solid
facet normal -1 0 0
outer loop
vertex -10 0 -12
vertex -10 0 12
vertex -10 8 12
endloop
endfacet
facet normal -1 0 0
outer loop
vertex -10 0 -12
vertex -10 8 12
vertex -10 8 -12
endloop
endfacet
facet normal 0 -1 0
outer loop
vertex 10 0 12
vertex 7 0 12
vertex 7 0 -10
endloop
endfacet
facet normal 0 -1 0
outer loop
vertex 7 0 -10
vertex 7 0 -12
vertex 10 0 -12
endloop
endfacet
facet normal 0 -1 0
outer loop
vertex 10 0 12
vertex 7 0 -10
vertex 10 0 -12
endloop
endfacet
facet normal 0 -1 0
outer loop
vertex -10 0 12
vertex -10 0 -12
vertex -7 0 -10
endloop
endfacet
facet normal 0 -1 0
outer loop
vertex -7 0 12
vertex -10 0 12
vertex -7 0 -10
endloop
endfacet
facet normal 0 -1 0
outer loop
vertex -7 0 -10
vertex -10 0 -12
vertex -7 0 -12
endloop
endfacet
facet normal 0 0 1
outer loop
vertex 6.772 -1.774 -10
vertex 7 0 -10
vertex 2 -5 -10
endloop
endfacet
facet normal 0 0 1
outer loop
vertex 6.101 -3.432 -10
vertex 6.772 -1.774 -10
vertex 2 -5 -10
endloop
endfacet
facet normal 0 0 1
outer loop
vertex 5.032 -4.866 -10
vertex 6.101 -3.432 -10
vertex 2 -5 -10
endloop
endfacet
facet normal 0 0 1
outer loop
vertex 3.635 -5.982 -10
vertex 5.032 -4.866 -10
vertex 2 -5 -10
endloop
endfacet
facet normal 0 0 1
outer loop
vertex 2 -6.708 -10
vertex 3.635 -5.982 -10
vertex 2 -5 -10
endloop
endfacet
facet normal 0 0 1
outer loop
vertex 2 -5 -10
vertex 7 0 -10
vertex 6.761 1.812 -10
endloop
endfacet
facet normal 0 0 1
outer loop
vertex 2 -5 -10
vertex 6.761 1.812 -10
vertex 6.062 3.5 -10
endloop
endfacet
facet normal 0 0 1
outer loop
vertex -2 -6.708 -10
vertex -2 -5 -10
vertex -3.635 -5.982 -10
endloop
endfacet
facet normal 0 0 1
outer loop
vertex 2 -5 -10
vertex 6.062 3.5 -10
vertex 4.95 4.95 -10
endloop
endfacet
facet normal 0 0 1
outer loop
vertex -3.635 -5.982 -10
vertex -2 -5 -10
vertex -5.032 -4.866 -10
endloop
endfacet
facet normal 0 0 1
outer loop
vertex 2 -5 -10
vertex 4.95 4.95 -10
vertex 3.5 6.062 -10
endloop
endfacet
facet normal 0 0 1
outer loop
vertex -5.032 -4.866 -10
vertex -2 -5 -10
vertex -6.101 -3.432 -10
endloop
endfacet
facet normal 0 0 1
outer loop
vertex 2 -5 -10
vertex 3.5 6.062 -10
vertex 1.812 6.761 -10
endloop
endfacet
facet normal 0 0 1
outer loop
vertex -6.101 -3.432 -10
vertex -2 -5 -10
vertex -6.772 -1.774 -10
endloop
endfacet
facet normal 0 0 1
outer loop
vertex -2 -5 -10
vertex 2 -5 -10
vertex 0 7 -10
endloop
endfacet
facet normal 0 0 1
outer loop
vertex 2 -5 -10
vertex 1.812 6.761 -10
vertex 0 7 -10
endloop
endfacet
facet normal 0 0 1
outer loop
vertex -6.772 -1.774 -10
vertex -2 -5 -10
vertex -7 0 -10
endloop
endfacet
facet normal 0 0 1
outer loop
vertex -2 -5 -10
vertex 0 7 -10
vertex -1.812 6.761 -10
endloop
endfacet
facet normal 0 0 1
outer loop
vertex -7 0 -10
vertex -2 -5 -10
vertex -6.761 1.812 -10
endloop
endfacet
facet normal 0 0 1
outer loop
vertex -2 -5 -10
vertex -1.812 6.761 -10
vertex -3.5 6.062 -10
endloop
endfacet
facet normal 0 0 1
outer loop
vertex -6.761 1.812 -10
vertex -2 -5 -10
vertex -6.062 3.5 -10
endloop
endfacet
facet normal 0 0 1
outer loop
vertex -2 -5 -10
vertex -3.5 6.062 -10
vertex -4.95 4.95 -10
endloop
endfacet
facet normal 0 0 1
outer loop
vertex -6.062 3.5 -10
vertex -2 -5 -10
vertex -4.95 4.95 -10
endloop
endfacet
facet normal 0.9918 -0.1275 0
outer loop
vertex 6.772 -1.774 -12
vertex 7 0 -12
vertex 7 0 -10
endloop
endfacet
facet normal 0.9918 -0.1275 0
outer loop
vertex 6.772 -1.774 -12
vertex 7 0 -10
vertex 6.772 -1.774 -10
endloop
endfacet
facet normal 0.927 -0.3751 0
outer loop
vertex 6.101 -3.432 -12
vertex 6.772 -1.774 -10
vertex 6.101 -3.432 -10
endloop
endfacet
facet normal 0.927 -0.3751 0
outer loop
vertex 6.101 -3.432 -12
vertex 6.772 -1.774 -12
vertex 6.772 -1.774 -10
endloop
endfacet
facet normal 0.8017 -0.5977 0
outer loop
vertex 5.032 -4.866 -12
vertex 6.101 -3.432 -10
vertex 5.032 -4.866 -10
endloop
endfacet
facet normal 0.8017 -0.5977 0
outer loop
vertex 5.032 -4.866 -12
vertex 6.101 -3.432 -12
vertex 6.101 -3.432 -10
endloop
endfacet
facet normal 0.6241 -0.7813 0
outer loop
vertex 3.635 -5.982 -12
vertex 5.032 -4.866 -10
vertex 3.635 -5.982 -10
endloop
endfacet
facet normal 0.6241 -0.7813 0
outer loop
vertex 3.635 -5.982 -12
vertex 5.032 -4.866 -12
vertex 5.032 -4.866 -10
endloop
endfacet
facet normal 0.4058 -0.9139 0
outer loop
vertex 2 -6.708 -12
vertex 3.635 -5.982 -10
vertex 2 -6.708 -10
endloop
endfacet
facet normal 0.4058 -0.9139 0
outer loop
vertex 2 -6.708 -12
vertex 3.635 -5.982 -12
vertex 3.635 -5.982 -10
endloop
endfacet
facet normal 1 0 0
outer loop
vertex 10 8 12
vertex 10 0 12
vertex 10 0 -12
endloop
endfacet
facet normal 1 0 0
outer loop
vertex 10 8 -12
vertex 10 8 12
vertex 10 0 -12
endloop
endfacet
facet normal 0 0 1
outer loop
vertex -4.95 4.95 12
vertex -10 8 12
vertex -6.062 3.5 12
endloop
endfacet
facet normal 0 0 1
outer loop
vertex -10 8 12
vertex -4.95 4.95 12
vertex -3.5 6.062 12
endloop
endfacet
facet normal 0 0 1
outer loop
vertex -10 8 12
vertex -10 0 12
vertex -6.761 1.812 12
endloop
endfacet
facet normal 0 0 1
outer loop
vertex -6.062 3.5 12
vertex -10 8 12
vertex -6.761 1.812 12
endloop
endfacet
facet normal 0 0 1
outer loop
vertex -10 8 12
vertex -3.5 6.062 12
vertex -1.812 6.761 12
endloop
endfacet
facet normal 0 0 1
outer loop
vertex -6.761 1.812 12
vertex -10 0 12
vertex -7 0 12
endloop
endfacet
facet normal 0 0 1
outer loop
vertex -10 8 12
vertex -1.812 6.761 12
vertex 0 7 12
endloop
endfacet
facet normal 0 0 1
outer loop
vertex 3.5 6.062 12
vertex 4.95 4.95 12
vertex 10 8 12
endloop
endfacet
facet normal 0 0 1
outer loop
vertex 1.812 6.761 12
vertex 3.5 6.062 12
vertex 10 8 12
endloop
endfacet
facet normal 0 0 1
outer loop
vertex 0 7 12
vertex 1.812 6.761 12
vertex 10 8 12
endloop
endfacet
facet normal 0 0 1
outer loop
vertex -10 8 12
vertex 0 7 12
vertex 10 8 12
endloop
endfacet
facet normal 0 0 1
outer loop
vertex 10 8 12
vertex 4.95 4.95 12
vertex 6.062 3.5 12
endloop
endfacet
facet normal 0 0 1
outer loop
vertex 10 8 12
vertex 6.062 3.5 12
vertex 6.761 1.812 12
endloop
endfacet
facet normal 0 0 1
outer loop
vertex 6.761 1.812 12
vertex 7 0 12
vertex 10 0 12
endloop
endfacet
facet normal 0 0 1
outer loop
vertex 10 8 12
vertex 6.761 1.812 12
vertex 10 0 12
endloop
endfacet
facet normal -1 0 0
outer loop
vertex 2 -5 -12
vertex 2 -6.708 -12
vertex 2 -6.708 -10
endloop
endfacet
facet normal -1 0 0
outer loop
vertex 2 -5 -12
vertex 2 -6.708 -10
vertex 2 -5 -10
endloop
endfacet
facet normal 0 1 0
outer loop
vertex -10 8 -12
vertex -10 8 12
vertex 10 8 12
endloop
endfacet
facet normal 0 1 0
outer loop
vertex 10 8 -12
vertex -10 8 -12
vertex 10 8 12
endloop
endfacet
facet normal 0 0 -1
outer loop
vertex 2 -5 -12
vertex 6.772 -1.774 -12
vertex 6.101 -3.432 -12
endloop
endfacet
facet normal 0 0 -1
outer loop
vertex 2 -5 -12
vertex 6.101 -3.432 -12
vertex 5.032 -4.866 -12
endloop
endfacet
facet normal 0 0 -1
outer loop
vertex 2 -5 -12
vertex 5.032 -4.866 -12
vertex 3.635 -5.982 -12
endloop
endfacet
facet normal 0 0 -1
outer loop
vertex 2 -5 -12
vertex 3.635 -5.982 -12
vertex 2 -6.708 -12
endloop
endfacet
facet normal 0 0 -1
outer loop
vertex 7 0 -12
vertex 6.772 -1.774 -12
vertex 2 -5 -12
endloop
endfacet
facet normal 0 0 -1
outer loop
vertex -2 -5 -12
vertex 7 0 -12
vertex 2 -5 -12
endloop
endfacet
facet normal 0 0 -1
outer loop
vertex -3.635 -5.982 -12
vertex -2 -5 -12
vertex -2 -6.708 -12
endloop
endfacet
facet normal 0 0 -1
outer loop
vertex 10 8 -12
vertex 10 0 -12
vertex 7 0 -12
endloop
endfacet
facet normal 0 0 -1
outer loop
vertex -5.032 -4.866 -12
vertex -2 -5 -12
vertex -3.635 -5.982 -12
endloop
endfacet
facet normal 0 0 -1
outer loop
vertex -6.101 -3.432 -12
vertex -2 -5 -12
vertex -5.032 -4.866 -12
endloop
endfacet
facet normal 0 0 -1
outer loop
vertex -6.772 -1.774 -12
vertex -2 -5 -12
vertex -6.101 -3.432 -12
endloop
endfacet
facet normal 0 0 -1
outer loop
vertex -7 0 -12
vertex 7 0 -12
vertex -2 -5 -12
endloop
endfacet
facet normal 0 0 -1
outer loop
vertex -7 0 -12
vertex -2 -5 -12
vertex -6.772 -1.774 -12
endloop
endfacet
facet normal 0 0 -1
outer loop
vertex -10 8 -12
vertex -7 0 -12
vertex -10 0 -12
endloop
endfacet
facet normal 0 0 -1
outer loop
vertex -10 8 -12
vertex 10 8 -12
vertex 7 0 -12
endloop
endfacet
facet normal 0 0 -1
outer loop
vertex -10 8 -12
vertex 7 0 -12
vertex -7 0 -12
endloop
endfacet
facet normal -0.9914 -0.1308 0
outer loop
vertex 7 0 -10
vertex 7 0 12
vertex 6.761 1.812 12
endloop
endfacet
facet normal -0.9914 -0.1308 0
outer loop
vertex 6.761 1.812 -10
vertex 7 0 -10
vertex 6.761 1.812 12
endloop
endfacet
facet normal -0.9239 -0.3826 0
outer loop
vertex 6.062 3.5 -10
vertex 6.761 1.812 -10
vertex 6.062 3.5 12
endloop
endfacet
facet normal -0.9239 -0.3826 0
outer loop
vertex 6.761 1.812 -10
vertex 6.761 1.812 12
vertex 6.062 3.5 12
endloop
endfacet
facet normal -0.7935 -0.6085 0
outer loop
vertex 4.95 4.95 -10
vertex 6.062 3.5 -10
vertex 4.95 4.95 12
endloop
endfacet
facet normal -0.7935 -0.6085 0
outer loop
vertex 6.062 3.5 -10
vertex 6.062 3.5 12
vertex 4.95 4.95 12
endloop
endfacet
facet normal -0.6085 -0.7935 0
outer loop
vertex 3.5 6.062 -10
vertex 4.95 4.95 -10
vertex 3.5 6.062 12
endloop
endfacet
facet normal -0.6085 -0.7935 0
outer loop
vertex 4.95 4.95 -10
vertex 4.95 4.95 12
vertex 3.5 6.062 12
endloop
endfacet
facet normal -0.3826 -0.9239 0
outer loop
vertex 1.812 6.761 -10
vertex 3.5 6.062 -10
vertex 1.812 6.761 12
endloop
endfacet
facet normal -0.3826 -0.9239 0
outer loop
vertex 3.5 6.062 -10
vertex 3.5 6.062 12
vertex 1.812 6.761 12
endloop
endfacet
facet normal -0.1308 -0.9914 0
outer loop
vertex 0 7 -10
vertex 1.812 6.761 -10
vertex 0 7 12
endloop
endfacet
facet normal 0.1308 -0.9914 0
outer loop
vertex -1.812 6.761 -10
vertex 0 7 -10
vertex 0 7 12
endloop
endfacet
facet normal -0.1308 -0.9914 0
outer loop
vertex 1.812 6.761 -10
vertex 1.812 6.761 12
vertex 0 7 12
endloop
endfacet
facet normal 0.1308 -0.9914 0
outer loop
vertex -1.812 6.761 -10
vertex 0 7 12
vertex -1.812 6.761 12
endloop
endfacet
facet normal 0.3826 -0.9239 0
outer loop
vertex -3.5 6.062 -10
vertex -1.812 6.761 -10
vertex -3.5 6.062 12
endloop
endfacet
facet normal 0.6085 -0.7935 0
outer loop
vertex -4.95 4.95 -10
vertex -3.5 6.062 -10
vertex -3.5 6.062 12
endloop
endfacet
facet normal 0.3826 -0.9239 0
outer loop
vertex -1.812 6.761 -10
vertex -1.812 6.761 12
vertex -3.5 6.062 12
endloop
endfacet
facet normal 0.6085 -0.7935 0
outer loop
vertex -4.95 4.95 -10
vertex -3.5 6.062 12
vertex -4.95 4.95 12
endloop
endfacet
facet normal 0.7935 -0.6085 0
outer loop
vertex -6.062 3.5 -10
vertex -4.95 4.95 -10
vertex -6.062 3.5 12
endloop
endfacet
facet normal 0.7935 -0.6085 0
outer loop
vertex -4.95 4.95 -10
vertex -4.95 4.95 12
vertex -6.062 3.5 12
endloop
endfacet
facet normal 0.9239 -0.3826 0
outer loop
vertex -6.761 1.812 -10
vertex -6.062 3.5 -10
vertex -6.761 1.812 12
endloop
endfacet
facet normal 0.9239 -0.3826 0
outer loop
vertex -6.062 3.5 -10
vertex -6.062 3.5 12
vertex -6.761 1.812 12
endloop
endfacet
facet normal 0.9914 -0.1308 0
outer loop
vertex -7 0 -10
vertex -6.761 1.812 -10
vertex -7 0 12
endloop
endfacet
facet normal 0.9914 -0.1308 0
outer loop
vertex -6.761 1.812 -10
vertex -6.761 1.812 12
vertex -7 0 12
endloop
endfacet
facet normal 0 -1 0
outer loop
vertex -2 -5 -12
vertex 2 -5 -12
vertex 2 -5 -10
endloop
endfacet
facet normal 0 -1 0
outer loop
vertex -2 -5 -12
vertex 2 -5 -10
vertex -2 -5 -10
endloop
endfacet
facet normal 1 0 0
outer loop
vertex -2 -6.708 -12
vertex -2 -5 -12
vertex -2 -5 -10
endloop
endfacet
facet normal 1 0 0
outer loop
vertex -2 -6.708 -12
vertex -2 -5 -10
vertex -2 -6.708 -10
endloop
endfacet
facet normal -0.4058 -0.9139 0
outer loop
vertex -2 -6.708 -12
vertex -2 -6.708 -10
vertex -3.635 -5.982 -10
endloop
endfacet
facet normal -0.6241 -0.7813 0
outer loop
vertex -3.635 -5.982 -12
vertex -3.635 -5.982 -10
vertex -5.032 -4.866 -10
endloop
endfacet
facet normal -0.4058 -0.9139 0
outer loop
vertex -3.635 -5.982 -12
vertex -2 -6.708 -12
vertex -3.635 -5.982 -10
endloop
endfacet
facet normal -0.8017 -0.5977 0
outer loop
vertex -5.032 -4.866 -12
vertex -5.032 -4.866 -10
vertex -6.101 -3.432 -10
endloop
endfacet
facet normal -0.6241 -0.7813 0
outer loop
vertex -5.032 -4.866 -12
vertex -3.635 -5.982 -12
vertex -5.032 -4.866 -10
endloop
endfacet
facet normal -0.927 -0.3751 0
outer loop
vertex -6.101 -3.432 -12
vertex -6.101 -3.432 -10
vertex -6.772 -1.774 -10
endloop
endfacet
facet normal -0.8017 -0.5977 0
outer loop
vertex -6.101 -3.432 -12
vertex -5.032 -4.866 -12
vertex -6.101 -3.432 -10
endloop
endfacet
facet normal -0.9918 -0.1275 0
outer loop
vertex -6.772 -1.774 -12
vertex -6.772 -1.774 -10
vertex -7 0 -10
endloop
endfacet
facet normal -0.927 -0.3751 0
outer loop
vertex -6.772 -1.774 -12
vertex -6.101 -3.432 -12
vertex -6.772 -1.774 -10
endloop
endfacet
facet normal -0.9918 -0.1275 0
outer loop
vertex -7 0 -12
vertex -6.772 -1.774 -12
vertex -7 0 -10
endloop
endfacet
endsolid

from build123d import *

# Parameters (mm, degrees)
SKETCH1_W           = 20
SKETCH1_H           = 24
BOSS_EXTRUDE1_DEPTH = 8
SKETCH2_R           = 7
CUT_EXTRUDE1_DEPTH  = 22
BOSS_EXTRUDE2_DEPTH = 2


with BuildPart() as part:
    # Sketch1 → Boss-Extrude1 (new body)
    with BuildSketch(Plane(origin=(0, 0, 0), x_dir=(1, 0, 0), z_dir=(0, 1, 0))):
        Rectangle(SKETCH1_W, SKETCH1_H)
    extrude(amount=BOSS_EXTRUDE1_DEPTH)

    # Sketch2 → Cut-Extrude1 (cut)
    with BuildSketch(Plane.XY.offset(12)):
        Circle(SKETCH2_R)
    extrude(amount=-CUT_EXTRUDE1_DEPTH, mode=Mode.SUBTRACT)

    # Sketch3 → Boss-Extrude2 (add)
    with BuildSketch(Plane(origin=(0, 0, -12), x_dir=(-1, 0, 0), z_dir=(0, 0, -1))):
        with BuildLine():
            Line((-2, -6.708203932), (-2, -5))
            Line((-2, -5), (2, -5))
            Line((2, -5), (2, -6.708203932))
            ThreePointArc((2, -6.708203932), (0, 7), (-2, -6.708203932))
        make_face()
    extrude(amount=-BOSS_EXTRUDE2_DEPTH)


solid = part.part
